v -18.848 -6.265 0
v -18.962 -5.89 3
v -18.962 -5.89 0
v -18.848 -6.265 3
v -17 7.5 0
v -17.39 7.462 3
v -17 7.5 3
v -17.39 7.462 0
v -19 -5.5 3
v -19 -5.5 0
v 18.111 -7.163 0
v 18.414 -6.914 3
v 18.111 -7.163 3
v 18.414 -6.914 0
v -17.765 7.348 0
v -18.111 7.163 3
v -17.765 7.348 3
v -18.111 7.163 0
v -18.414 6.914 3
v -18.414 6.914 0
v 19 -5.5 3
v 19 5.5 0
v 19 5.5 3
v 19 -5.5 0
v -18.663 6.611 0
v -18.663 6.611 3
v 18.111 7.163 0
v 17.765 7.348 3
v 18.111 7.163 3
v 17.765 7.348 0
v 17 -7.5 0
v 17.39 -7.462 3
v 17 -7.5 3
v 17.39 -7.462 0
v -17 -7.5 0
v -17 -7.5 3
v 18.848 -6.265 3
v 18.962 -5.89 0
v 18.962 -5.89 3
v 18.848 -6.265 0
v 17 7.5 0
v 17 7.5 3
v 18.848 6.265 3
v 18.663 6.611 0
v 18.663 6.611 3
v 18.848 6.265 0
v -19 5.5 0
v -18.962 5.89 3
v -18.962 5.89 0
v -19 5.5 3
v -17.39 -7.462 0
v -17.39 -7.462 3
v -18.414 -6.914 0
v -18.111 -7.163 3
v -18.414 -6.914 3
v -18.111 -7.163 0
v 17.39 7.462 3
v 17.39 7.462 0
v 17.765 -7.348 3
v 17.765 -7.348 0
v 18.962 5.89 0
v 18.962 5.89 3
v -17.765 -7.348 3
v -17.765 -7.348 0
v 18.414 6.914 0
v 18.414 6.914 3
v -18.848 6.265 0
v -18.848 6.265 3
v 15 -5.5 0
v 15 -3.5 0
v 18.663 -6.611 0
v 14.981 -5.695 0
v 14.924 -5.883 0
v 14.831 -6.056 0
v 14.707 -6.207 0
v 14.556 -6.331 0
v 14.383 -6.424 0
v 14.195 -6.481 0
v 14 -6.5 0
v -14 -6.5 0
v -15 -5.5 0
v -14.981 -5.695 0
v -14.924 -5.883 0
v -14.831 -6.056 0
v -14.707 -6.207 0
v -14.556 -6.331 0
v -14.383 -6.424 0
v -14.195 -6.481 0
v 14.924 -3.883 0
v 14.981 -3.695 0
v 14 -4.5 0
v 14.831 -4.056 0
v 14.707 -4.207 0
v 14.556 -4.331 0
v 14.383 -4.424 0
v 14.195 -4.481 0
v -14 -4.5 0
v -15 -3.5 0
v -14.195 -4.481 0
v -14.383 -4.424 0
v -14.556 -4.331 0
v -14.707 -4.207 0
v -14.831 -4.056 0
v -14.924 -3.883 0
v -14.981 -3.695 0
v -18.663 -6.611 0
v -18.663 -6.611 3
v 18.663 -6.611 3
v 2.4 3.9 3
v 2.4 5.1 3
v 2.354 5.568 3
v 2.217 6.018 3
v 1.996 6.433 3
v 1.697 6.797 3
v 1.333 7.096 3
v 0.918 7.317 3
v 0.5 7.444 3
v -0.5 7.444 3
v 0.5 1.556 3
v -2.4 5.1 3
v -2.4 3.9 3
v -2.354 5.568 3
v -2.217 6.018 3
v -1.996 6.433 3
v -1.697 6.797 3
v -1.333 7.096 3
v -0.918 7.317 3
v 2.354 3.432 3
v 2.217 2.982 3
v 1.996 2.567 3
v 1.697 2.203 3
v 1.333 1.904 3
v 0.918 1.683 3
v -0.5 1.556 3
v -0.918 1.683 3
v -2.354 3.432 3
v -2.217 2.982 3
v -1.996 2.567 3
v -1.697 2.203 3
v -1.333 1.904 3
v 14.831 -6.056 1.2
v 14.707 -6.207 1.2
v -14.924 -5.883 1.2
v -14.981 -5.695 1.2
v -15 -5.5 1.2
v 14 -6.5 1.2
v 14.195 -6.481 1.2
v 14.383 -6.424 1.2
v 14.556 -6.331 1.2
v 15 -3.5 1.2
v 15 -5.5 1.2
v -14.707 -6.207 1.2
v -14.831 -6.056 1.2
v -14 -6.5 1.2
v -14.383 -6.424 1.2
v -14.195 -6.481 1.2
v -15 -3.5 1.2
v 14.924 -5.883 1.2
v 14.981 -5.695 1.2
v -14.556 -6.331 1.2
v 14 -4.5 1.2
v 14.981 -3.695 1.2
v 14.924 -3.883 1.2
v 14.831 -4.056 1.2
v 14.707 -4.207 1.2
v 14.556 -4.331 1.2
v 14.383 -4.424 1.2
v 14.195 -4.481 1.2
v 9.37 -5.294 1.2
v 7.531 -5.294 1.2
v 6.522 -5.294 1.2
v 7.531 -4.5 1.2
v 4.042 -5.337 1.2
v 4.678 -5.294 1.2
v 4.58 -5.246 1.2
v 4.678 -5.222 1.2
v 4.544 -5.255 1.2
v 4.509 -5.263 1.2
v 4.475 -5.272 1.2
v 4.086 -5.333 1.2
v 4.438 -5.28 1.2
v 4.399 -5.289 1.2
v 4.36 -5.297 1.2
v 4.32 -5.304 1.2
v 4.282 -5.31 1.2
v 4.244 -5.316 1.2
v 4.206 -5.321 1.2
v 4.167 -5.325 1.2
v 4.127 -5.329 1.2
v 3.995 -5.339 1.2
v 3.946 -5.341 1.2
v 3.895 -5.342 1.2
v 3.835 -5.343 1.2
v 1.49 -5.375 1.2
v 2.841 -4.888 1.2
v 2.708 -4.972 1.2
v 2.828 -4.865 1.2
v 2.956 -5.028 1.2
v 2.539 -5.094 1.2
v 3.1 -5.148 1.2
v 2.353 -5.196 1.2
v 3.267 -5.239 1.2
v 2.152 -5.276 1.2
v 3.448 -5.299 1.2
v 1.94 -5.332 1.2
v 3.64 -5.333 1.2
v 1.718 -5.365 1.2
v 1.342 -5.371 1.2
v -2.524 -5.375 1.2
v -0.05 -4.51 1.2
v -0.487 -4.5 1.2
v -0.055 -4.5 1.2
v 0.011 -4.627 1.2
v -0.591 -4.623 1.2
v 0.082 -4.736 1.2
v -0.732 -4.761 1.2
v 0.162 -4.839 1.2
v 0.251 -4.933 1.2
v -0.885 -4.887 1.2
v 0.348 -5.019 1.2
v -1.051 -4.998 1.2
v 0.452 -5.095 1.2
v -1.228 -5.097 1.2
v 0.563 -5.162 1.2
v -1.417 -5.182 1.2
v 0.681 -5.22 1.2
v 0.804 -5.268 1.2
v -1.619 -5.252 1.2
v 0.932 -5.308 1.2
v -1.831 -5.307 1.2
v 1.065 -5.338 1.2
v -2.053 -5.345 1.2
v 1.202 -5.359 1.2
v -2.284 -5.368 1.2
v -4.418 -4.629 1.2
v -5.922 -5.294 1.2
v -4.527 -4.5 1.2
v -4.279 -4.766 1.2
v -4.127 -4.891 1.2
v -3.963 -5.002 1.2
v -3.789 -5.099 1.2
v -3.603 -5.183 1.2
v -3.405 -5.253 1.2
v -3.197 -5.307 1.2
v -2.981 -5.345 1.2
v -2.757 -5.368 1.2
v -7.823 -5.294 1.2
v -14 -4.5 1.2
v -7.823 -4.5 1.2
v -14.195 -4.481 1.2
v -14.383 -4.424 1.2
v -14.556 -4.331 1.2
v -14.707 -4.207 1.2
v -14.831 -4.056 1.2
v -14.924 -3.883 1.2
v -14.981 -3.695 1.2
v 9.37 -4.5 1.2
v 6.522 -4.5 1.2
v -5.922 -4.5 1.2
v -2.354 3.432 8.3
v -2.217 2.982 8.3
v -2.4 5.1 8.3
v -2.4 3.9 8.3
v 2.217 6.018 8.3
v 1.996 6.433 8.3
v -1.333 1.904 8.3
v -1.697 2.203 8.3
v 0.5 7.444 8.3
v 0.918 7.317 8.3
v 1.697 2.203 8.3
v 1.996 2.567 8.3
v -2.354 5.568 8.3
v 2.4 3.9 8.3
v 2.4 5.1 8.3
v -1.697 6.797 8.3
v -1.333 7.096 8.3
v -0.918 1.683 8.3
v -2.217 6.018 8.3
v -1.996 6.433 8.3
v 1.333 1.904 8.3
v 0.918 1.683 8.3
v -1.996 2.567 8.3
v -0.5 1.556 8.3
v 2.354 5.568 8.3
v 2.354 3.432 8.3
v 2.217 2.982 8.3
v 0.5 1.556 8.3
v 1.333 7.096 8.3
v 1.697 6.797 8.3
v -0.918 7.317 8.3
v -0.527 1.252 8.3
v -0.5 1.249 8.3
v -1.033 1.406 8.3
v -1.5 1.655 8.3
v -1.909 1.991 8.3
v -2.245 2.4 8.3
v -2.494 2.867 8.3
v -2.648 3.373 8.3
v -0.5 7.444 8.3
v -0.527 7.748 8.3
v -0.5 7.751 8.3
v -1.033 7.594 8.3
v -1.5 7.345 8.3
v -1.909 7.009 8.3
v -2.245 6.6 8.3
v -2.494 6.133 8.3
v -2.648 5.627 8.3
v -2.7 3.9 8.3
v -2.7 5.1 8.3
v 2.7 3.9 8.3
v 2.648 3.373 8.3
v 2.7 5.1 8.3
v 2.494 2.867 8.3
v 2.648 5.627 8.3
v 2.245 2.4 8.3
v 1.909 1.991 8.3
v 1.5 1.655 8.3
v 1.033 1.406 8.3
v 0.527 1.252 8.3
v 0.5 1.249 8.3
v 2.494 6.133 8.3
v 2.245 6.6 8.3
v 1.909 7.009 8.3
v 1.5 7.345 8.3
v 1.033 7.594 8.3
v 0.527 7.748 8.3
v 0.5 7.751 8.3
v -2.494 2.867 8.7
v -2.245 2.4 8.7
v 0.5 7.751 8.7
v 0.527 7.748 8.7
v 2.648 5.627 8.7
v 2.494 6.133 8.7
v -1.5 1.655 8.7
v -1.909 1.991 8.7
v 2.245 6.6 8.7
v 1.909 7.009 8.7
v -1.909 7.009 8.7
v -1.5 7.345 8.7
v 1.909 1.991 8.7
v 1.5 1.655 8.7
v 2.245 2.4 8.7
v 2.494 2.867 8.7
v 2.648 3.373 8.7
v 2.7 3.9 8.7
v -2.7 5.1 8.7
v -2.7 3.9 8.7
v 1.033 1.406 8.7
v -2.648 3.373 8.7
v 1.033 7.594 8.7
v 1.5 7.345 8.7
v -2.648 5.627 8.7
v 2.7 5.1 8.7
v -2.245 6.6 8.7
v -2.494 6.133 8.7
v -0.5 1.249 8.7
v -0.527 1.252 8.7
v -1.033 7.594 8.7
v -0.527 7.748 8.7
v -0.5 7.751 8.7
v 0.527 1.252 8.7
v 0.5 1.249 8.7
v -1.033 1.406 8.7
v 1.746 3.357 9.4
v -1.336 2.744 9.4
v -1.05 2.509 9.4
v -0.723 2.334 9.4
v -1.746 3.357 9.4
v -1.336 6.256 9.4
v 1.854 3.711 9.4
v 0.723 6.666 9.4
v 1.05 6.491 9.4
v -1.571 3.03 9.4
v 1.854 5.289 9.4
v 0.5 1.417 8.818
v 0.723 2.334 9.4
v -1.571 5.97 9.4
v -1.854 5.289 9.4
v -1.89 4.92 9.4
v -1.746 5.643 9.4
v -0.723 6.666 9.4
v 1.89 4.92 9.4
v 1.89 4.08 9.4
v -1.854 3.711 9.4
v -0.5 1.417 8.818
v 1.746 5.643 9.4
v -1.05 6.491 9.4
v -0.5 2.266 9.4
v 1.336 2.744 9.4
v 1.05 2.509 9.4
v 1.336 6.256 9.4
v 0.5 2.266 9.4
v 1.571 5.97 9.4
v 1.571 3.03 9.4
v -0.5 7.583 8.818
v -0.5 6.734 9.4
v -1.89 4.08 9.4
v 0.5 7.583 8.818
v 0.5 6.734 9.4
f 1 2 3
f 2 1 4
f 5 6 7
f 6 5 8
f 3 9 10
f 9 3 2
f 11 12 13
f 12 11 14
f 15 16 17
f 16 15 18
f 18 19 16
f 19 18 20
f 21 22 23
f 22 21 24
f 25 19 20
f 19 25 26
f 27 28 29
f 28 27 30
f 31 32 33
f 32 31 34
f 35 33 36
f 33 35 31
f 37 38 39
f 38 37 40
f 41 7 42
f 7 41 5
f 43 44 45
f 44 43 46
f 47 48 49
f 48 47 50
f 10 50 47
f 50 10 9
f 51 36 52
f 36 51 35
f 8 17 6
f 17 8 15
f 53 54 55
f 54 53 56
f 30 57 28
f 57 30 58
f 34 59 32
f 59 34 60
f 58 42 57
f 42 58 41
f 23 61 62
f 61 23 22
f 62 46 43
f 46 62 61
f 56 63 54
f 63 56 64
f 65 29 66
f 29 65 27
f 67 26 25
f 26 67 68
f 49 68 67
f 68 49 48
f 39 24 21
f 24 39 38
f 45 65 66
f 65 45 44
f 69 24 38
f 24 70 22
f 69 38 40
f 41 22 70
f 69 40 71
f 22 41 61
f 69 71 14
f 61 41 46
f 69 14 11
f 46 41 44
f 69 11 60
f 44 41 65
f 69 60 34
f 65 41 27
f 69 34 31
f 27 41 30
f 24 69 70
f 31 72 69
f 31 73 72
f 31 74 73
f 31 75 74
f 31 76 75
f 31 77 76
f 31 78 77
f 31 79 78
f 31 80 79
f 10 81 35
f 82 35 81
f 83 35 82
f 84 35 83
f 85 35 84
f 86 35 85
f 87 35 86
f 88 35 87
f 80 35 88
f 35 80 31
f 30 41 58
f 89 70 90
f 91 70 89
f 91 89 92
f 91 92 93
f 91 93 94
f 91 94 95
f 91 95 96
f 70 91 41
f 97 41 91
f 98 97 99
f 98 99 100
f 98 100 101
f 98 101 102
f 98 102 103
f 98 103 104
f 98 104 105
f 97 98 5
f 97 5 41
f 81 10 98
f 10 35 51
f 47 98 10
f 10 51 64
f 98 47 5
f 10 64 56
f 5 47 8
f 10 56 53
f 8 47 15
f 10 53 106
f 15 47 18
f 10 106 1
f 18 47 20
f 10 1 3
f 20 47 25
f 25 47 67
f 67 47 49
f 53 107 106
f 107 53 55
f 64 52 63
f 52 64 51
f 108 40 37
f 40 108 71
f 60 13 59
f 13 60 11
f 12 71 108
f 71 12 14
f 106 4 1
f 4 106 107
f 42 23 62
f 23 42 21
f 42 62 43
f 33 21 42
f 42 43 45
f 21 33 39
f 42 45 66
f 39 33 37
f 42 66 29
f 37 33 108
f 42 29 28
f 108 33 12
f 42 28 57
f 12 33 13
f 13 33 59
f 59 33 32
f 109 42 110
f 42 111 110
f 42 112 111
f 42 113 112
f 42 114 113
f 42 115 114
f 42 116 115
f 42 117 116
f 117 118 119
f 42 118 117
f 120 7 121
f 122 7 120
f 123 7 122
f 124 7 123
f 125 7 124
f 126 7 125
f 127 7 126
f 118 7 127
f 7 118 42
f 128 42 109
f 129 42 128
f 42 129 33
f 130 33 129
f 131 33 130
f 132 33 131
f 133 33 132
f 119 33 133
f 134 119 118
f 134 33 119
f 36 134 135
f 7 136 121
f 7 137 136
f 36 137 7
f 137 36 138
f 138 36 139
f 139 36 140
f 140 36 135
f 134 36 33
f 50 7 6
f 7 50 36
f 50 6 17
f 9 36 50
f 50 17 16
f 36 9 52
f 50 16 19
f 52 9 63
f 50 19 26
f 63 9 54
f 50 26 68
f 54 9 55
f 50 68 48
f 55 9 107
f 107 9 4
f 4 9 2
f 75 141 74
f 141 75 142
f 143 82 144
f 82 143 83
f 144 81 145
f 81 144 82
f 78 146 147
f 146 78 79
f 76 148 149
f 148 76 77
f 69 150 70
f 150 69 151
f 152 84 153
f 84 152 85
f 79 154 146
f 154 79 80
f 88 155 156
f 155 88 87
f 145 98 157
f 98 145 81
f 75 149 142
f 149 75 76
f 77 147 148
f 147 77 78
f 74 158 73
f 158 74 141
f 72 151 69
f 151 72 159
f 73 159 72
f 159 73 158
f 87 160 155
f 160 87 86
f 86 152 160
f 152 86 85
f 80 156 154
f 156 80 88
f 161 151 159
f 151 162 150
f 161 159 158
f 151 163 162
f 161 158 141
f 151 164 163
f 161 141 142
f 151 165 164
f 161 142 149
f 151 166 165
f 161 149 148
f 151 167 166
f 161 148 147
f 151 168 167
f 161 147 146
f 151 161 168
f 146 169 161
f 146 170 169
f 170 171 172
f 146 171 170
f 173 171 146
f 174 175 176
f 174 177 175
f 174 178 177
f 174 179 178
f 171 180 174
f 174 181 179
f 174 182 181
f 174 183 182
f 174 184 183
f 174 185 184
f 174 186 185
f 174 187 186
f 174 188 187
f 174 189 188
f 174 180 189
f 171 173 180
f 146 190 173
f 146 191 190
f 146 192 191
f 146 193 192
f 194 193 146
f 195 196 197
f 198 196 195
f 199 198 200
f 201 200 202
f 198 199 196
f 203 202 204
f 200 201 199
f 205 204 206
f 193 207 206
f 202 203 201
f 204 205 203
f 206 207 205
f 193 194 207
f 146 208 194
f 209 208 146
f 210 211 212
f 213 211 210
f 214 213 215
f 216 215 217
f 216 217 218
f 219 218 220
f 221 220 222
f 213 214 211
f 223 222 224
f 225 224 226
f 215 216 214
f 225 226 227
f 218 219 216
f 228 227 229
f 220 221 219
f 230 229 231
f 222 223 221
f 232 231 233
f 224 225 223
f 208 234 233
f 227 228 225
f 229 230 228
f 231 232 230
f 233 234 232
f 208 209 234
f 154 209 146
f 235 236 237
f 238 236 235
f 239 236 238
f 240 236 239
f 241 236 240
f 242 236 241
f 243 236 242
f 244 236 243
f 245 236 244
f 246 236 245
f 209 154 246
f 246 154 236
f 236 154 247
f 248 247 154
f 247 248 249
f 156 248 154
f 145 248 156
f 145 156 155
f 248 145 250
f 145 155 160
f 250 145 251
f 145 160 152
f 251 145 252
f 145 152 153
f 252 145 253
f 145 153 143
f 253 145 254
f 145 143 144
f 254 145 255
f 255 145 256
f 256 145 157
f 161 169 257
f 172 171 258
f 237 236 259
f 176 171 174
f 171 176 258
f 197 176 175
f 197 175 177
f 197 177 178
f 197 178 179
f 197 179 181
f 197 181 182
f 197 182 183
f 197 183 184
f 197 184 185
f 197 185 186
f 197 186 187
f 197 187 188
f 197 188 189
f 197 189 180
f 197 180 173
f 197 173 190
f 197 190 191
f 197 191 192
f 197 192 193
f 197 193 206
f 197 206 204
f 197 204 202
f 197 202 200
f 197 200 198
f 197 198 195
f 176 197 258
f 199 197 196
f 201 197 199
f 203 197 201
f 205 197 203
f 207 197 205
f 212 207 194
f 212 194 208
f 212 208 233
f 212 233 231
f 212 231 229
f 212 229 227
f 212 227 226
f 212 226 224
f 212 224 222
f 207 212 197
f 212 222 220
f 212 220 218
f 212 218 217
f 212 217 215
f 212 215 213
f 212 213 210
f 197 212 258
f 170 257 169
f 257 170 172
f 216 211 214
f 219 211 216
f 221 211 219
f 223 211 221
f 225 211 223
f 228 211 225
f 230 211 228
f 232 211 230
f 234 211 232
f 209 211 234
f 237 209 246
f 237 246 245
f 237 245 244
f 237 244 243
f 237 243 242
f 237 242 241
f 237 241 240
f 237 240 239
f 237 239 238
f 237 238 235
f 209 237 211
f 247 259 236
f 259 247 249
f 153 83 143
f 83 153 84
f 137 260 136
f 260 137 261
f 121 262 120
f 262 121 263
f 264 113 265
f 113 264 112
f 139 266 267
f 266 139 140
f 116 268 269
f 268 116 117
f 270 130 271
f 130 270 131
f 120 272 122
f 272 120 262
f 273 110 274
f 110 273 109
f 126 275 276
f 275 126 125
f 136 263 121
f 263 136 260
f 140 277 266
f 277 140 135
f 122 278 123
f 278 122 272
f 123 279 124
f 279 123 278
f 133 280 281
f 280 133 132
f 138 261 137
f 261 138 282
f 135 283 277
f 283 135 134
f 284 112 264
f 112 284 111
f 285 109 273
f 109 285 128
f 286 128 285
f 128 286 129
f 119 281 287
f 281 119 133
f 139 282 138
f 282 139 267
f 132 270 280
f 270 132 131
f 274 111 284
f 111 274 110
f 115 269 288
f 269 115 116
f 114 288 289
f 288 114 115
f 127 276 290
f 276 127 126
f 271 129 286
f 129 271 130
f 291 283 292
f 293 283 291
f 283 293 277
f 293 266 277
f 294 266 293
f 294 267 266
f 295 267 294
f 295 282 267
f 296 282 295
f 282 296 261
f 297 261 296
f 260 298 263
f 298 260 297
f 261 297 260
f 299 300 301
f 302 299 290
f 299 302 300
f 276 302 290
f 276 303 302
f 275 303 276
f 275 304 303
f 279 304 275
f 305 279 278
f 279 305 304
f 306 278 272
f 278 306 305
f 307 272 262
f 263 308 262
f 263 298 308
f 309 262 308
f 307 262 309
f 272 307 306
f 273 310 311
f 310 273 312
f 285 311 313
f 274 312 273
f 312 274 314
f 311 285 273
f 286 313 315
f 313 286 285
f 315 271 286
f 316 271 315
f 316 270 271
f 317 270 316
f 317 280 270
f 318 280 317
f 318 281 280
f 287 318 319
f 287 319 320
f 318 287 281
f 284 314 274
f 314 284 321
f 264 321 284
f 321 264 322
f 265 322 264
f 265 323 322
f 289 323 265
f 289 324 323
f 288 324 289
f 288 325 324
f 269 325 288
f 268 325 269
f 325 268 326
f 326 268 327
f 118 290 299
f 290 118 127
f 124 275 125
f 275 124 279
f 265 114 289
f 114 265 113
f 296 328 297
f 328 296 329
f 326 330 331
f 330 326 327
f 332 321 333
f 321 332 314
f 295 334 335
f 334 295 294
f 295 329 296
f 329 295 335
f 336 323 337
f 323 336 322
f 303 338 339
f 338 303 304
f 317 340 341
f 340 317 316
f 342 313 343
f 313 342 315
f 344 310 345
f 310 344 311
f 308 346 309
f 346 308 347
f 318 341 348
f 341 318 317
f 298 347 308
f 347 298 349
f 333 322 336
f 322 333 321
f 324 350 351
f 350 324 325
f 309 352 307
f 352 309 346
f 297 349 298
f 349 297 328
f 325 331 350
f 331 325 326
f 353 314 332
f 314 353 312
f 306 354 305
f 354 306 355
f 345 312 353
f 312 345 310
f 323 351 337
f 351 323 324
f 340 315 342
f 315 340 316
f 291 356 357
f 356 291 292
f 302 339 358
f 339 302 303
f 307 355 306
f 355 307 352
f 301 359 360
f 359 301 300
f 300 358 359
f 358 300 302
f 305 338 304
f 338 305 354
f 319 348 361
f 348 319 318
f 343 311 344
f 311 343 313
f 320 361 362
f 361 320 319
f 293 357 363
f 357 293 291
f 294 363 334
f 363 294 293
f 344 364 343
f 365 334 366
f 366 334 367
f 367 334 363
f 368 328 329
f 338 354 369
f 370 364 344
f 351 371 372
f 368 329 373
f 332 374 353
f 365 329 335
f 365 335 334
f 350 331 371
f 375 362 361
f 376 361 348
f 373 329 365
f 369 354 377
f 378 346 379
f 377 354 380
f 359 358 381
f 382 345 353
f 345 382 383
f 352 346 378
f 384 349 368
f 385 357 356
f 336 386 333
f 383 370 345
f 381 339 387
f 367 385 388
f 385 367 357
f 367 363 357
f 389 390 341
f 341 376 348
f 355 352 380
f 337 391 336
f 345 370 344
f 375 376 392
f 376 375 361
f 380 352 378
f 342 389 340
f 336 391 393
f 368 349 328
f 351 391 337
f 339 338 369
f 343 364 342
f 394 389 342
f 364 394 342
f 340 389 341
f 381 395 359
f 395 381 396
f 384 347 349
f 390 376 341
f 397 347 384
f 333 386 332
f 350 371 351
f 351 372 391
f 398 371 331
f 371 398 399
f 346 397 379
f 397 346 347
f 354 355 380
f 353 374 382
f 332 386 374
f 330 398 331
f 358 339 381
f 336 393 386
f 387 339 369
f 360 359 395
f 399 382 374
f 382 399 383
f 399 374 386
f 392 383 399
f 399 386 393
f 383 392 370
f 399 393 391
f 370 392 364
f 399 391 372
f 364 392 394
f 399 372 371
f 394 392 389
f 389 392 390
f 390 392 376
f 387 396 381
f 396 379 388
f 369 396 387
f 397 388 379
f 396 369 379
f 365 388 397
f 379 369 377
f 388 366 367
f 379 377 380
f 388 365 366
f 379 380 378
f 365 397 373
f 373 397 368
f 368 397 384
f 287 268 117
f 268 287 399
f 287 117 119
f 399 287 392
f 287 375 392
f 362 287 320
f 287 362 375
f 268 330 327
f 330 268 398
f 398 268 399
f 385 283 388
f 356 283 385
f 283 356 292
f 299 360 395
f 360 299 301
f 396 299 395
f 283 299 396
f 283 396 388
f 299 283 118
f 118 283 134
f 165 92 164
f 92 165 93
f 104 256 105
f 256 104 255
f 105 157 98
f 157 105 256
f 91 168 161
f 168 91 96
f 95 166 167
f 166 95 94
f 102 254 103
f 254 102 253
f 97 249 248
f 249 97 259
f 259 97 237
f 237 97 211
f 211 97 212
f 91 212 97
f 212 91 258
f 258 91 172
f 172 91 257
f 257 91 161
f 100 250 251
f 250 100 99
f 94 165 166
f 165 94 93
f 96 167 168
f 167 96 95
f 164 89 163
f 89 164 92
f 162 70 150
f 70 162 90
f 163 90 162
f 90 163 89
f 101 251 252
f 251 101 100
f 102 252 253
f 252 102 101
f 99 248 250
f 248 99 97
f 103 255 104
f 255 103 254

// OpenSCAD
// Parametric SKADIS Subject Tag (One-Part Stencil Cut-out Design)
// Designed for Easy Support-Free Face-Down Printing!
// The text is cut completely through the plate to show the background color.

/* [Tag settings] */
subject_text = "Toán"; // Subject name
tag_width = 38;        // Width of the tag (fits 40mm horizontal spacing)
tag_height = 15;       // Height of the tag
tag_thickness = 3.0;   // Base plate thickness (15 layers at 0.2mm)
corner_radius = 2.0;   // Rounded corner radius
text_size = 6.0;       // Text font size
font_name = "Arial:style=Bold";
stroke_offset = 0.35;  // Thickness offset to make text strokes thicker

/* [Inlay / Assembly settings] */
// "assembly" = plate + text inlay assembled (different colors, for preview / AMS)
// "plate" = only the plate with recessed text cavity
// "text" = only the text letters to be inlaid (with tolerance)
generate_mode = "assembly"; 
inlay_depth = 1.2;      // Depth of the cavity
inlay_tolerance = 0.15; // Clearance for loose fit when printing separately
text_raised_height = 0.8; // Height of the raised text on the inlay plate
cavity_width = 30;     // Width of the rectangular cavity
cavity_height = 9;      // Height of the rectangular cavity

/* [Mount settings] */
// Peg is placed at the top to avoid intersecting with the cut-out text
peg_width = 4.8;
peg_height = 6.0;        // Shorter peg (6mm) to stay at the top edge
peg_y_offset = 4.5;      // Shift peg to the top edge
board_thickness = 5.24;
slit_width = 1.0;

$fn = 32;

module rounded_plate(w, h, t, r) {
    linear_extrude(height=t) {
        hull() {
            translate([-w/2 + r, -h/2 + r]) circle(r=r);
            translate([w/2 - r, -h/2 + r]) circle(r=r);
            translate([-w/2 + r, h/2 - r]) circle(r=r);
            translate([w/2 - r, h/2 - r]) circle(r=r);
        }
    }
}

module oval_profile(w, h) {
    hull() {
        translate([0, (h - w)/2]) circle(d=w);
        translate([0, -(h - w)/2]) circle(d=w);
    }
}

module split_snap_peg() {
    difference() {
        union() {
            // Main peg shaft (height 5.3mm)
            linear_extrude(height=5.3) {
                oval_profile(peg_width, peg_height);
            }
            
            // Latching lip (height 0.4mm)
            translate([0, 0, 5.3])
            linear_extrude(height=0.4) {
                oval_profile(peg_width + 0.6, peg_height + 0.6);
            }
            
            // Tapered insertion tip (height 0.7mm)
            translate([0, 0, 5.7])
            linear_extrude(height=0.7, scale=[0.7, 0.7]) {
                oval_profile(peg_width + 0.6, peg_height + 0.6);
            }
        }
        
        // Compression slit (centered, vertical split)
        translate([-slit_width/2, -peg_height, -1])
        cube([slit_width, peg_height*2, 8]);
    }
}

// Assemble the tag
if (generate_mode == "plate") {
    // 1. Plate with rectangular cavity (centered at Y = -2.0, depth = inlay_depth)
    difference() {
        rounded_plate(tag_width, tag_height, tag_thickness, corner_radius);
        
        // Rectangular cavity
        translate([0, -2.0, -0.1])
        rounded_plate(cavity_width, cavity_height, inlay_depth + 0.1, 1.0);
    }
    
    // 2. Peg pointing UP from the back of plate (Z starting at tag_thickness)
    translate([0, peg_y_offset, tag_thickness])
    split_snap_peg();
} else if (generate_mode == "text") {
    // Rectangular insert with raised text (printed face-up, flat on bed)
    union() {
        // 1. Backing plate (shrunk by inlay_tolerance)
        color("white")
        rounded_plate(cavity_width - 2 * inlay_tolerance, cavity_height - 2 * inlay_tolerance, inlay_depth, 1.0);
        
        // 2. Raised text on top (Z starts at inlay_depth, height = text_raised_height, face-up, no mirror!)
        color("red")
        translate([0, -2.0, inlay_depth])
        linear_extrude(height=text_raised_height) {
            offset(delta=stroke_offset)
            text(subject_text, size=text_size, font=font_name, halign="center", valign="center");
        }
    }
} else {
    // Preview / Assembly (Default)
    union() {
        // Teal Plate with cavity
        color("teal")
        difference() {
            rounded_plate(tag_width, tag_height, tag_thickness, corner_radius);
            
            // Rectangular cavity
            translate([0, -2.0, -0.1])
            rounded_plate(cavity_width, cavity_height, inlay_depth + 0.1, 1.0);
        }
        
        // Grey Peg on the back
        color("darkslategrey")
        translate([0, peg_y_offset, tag_thickness])
        split_snap_peg();
        
        // Assembled Text Inlay (perfect fit, no tolerance for assembly preview/AMS)
        translate([0, 0, 0])
        union() {
            color("white")
            rounded_plate(cavity_width, cavity_height, inlay_depth, 1.0);
            
            color("red")
            translate([0, -2.0, inlay_depth])
            linear_extrude(height=text_raised_height) {
                offset(delta=stroke_offset)
                text(subject_text, size=text_size, font=font_name, halign="center", valign="center");
            }
        }
    }
}
